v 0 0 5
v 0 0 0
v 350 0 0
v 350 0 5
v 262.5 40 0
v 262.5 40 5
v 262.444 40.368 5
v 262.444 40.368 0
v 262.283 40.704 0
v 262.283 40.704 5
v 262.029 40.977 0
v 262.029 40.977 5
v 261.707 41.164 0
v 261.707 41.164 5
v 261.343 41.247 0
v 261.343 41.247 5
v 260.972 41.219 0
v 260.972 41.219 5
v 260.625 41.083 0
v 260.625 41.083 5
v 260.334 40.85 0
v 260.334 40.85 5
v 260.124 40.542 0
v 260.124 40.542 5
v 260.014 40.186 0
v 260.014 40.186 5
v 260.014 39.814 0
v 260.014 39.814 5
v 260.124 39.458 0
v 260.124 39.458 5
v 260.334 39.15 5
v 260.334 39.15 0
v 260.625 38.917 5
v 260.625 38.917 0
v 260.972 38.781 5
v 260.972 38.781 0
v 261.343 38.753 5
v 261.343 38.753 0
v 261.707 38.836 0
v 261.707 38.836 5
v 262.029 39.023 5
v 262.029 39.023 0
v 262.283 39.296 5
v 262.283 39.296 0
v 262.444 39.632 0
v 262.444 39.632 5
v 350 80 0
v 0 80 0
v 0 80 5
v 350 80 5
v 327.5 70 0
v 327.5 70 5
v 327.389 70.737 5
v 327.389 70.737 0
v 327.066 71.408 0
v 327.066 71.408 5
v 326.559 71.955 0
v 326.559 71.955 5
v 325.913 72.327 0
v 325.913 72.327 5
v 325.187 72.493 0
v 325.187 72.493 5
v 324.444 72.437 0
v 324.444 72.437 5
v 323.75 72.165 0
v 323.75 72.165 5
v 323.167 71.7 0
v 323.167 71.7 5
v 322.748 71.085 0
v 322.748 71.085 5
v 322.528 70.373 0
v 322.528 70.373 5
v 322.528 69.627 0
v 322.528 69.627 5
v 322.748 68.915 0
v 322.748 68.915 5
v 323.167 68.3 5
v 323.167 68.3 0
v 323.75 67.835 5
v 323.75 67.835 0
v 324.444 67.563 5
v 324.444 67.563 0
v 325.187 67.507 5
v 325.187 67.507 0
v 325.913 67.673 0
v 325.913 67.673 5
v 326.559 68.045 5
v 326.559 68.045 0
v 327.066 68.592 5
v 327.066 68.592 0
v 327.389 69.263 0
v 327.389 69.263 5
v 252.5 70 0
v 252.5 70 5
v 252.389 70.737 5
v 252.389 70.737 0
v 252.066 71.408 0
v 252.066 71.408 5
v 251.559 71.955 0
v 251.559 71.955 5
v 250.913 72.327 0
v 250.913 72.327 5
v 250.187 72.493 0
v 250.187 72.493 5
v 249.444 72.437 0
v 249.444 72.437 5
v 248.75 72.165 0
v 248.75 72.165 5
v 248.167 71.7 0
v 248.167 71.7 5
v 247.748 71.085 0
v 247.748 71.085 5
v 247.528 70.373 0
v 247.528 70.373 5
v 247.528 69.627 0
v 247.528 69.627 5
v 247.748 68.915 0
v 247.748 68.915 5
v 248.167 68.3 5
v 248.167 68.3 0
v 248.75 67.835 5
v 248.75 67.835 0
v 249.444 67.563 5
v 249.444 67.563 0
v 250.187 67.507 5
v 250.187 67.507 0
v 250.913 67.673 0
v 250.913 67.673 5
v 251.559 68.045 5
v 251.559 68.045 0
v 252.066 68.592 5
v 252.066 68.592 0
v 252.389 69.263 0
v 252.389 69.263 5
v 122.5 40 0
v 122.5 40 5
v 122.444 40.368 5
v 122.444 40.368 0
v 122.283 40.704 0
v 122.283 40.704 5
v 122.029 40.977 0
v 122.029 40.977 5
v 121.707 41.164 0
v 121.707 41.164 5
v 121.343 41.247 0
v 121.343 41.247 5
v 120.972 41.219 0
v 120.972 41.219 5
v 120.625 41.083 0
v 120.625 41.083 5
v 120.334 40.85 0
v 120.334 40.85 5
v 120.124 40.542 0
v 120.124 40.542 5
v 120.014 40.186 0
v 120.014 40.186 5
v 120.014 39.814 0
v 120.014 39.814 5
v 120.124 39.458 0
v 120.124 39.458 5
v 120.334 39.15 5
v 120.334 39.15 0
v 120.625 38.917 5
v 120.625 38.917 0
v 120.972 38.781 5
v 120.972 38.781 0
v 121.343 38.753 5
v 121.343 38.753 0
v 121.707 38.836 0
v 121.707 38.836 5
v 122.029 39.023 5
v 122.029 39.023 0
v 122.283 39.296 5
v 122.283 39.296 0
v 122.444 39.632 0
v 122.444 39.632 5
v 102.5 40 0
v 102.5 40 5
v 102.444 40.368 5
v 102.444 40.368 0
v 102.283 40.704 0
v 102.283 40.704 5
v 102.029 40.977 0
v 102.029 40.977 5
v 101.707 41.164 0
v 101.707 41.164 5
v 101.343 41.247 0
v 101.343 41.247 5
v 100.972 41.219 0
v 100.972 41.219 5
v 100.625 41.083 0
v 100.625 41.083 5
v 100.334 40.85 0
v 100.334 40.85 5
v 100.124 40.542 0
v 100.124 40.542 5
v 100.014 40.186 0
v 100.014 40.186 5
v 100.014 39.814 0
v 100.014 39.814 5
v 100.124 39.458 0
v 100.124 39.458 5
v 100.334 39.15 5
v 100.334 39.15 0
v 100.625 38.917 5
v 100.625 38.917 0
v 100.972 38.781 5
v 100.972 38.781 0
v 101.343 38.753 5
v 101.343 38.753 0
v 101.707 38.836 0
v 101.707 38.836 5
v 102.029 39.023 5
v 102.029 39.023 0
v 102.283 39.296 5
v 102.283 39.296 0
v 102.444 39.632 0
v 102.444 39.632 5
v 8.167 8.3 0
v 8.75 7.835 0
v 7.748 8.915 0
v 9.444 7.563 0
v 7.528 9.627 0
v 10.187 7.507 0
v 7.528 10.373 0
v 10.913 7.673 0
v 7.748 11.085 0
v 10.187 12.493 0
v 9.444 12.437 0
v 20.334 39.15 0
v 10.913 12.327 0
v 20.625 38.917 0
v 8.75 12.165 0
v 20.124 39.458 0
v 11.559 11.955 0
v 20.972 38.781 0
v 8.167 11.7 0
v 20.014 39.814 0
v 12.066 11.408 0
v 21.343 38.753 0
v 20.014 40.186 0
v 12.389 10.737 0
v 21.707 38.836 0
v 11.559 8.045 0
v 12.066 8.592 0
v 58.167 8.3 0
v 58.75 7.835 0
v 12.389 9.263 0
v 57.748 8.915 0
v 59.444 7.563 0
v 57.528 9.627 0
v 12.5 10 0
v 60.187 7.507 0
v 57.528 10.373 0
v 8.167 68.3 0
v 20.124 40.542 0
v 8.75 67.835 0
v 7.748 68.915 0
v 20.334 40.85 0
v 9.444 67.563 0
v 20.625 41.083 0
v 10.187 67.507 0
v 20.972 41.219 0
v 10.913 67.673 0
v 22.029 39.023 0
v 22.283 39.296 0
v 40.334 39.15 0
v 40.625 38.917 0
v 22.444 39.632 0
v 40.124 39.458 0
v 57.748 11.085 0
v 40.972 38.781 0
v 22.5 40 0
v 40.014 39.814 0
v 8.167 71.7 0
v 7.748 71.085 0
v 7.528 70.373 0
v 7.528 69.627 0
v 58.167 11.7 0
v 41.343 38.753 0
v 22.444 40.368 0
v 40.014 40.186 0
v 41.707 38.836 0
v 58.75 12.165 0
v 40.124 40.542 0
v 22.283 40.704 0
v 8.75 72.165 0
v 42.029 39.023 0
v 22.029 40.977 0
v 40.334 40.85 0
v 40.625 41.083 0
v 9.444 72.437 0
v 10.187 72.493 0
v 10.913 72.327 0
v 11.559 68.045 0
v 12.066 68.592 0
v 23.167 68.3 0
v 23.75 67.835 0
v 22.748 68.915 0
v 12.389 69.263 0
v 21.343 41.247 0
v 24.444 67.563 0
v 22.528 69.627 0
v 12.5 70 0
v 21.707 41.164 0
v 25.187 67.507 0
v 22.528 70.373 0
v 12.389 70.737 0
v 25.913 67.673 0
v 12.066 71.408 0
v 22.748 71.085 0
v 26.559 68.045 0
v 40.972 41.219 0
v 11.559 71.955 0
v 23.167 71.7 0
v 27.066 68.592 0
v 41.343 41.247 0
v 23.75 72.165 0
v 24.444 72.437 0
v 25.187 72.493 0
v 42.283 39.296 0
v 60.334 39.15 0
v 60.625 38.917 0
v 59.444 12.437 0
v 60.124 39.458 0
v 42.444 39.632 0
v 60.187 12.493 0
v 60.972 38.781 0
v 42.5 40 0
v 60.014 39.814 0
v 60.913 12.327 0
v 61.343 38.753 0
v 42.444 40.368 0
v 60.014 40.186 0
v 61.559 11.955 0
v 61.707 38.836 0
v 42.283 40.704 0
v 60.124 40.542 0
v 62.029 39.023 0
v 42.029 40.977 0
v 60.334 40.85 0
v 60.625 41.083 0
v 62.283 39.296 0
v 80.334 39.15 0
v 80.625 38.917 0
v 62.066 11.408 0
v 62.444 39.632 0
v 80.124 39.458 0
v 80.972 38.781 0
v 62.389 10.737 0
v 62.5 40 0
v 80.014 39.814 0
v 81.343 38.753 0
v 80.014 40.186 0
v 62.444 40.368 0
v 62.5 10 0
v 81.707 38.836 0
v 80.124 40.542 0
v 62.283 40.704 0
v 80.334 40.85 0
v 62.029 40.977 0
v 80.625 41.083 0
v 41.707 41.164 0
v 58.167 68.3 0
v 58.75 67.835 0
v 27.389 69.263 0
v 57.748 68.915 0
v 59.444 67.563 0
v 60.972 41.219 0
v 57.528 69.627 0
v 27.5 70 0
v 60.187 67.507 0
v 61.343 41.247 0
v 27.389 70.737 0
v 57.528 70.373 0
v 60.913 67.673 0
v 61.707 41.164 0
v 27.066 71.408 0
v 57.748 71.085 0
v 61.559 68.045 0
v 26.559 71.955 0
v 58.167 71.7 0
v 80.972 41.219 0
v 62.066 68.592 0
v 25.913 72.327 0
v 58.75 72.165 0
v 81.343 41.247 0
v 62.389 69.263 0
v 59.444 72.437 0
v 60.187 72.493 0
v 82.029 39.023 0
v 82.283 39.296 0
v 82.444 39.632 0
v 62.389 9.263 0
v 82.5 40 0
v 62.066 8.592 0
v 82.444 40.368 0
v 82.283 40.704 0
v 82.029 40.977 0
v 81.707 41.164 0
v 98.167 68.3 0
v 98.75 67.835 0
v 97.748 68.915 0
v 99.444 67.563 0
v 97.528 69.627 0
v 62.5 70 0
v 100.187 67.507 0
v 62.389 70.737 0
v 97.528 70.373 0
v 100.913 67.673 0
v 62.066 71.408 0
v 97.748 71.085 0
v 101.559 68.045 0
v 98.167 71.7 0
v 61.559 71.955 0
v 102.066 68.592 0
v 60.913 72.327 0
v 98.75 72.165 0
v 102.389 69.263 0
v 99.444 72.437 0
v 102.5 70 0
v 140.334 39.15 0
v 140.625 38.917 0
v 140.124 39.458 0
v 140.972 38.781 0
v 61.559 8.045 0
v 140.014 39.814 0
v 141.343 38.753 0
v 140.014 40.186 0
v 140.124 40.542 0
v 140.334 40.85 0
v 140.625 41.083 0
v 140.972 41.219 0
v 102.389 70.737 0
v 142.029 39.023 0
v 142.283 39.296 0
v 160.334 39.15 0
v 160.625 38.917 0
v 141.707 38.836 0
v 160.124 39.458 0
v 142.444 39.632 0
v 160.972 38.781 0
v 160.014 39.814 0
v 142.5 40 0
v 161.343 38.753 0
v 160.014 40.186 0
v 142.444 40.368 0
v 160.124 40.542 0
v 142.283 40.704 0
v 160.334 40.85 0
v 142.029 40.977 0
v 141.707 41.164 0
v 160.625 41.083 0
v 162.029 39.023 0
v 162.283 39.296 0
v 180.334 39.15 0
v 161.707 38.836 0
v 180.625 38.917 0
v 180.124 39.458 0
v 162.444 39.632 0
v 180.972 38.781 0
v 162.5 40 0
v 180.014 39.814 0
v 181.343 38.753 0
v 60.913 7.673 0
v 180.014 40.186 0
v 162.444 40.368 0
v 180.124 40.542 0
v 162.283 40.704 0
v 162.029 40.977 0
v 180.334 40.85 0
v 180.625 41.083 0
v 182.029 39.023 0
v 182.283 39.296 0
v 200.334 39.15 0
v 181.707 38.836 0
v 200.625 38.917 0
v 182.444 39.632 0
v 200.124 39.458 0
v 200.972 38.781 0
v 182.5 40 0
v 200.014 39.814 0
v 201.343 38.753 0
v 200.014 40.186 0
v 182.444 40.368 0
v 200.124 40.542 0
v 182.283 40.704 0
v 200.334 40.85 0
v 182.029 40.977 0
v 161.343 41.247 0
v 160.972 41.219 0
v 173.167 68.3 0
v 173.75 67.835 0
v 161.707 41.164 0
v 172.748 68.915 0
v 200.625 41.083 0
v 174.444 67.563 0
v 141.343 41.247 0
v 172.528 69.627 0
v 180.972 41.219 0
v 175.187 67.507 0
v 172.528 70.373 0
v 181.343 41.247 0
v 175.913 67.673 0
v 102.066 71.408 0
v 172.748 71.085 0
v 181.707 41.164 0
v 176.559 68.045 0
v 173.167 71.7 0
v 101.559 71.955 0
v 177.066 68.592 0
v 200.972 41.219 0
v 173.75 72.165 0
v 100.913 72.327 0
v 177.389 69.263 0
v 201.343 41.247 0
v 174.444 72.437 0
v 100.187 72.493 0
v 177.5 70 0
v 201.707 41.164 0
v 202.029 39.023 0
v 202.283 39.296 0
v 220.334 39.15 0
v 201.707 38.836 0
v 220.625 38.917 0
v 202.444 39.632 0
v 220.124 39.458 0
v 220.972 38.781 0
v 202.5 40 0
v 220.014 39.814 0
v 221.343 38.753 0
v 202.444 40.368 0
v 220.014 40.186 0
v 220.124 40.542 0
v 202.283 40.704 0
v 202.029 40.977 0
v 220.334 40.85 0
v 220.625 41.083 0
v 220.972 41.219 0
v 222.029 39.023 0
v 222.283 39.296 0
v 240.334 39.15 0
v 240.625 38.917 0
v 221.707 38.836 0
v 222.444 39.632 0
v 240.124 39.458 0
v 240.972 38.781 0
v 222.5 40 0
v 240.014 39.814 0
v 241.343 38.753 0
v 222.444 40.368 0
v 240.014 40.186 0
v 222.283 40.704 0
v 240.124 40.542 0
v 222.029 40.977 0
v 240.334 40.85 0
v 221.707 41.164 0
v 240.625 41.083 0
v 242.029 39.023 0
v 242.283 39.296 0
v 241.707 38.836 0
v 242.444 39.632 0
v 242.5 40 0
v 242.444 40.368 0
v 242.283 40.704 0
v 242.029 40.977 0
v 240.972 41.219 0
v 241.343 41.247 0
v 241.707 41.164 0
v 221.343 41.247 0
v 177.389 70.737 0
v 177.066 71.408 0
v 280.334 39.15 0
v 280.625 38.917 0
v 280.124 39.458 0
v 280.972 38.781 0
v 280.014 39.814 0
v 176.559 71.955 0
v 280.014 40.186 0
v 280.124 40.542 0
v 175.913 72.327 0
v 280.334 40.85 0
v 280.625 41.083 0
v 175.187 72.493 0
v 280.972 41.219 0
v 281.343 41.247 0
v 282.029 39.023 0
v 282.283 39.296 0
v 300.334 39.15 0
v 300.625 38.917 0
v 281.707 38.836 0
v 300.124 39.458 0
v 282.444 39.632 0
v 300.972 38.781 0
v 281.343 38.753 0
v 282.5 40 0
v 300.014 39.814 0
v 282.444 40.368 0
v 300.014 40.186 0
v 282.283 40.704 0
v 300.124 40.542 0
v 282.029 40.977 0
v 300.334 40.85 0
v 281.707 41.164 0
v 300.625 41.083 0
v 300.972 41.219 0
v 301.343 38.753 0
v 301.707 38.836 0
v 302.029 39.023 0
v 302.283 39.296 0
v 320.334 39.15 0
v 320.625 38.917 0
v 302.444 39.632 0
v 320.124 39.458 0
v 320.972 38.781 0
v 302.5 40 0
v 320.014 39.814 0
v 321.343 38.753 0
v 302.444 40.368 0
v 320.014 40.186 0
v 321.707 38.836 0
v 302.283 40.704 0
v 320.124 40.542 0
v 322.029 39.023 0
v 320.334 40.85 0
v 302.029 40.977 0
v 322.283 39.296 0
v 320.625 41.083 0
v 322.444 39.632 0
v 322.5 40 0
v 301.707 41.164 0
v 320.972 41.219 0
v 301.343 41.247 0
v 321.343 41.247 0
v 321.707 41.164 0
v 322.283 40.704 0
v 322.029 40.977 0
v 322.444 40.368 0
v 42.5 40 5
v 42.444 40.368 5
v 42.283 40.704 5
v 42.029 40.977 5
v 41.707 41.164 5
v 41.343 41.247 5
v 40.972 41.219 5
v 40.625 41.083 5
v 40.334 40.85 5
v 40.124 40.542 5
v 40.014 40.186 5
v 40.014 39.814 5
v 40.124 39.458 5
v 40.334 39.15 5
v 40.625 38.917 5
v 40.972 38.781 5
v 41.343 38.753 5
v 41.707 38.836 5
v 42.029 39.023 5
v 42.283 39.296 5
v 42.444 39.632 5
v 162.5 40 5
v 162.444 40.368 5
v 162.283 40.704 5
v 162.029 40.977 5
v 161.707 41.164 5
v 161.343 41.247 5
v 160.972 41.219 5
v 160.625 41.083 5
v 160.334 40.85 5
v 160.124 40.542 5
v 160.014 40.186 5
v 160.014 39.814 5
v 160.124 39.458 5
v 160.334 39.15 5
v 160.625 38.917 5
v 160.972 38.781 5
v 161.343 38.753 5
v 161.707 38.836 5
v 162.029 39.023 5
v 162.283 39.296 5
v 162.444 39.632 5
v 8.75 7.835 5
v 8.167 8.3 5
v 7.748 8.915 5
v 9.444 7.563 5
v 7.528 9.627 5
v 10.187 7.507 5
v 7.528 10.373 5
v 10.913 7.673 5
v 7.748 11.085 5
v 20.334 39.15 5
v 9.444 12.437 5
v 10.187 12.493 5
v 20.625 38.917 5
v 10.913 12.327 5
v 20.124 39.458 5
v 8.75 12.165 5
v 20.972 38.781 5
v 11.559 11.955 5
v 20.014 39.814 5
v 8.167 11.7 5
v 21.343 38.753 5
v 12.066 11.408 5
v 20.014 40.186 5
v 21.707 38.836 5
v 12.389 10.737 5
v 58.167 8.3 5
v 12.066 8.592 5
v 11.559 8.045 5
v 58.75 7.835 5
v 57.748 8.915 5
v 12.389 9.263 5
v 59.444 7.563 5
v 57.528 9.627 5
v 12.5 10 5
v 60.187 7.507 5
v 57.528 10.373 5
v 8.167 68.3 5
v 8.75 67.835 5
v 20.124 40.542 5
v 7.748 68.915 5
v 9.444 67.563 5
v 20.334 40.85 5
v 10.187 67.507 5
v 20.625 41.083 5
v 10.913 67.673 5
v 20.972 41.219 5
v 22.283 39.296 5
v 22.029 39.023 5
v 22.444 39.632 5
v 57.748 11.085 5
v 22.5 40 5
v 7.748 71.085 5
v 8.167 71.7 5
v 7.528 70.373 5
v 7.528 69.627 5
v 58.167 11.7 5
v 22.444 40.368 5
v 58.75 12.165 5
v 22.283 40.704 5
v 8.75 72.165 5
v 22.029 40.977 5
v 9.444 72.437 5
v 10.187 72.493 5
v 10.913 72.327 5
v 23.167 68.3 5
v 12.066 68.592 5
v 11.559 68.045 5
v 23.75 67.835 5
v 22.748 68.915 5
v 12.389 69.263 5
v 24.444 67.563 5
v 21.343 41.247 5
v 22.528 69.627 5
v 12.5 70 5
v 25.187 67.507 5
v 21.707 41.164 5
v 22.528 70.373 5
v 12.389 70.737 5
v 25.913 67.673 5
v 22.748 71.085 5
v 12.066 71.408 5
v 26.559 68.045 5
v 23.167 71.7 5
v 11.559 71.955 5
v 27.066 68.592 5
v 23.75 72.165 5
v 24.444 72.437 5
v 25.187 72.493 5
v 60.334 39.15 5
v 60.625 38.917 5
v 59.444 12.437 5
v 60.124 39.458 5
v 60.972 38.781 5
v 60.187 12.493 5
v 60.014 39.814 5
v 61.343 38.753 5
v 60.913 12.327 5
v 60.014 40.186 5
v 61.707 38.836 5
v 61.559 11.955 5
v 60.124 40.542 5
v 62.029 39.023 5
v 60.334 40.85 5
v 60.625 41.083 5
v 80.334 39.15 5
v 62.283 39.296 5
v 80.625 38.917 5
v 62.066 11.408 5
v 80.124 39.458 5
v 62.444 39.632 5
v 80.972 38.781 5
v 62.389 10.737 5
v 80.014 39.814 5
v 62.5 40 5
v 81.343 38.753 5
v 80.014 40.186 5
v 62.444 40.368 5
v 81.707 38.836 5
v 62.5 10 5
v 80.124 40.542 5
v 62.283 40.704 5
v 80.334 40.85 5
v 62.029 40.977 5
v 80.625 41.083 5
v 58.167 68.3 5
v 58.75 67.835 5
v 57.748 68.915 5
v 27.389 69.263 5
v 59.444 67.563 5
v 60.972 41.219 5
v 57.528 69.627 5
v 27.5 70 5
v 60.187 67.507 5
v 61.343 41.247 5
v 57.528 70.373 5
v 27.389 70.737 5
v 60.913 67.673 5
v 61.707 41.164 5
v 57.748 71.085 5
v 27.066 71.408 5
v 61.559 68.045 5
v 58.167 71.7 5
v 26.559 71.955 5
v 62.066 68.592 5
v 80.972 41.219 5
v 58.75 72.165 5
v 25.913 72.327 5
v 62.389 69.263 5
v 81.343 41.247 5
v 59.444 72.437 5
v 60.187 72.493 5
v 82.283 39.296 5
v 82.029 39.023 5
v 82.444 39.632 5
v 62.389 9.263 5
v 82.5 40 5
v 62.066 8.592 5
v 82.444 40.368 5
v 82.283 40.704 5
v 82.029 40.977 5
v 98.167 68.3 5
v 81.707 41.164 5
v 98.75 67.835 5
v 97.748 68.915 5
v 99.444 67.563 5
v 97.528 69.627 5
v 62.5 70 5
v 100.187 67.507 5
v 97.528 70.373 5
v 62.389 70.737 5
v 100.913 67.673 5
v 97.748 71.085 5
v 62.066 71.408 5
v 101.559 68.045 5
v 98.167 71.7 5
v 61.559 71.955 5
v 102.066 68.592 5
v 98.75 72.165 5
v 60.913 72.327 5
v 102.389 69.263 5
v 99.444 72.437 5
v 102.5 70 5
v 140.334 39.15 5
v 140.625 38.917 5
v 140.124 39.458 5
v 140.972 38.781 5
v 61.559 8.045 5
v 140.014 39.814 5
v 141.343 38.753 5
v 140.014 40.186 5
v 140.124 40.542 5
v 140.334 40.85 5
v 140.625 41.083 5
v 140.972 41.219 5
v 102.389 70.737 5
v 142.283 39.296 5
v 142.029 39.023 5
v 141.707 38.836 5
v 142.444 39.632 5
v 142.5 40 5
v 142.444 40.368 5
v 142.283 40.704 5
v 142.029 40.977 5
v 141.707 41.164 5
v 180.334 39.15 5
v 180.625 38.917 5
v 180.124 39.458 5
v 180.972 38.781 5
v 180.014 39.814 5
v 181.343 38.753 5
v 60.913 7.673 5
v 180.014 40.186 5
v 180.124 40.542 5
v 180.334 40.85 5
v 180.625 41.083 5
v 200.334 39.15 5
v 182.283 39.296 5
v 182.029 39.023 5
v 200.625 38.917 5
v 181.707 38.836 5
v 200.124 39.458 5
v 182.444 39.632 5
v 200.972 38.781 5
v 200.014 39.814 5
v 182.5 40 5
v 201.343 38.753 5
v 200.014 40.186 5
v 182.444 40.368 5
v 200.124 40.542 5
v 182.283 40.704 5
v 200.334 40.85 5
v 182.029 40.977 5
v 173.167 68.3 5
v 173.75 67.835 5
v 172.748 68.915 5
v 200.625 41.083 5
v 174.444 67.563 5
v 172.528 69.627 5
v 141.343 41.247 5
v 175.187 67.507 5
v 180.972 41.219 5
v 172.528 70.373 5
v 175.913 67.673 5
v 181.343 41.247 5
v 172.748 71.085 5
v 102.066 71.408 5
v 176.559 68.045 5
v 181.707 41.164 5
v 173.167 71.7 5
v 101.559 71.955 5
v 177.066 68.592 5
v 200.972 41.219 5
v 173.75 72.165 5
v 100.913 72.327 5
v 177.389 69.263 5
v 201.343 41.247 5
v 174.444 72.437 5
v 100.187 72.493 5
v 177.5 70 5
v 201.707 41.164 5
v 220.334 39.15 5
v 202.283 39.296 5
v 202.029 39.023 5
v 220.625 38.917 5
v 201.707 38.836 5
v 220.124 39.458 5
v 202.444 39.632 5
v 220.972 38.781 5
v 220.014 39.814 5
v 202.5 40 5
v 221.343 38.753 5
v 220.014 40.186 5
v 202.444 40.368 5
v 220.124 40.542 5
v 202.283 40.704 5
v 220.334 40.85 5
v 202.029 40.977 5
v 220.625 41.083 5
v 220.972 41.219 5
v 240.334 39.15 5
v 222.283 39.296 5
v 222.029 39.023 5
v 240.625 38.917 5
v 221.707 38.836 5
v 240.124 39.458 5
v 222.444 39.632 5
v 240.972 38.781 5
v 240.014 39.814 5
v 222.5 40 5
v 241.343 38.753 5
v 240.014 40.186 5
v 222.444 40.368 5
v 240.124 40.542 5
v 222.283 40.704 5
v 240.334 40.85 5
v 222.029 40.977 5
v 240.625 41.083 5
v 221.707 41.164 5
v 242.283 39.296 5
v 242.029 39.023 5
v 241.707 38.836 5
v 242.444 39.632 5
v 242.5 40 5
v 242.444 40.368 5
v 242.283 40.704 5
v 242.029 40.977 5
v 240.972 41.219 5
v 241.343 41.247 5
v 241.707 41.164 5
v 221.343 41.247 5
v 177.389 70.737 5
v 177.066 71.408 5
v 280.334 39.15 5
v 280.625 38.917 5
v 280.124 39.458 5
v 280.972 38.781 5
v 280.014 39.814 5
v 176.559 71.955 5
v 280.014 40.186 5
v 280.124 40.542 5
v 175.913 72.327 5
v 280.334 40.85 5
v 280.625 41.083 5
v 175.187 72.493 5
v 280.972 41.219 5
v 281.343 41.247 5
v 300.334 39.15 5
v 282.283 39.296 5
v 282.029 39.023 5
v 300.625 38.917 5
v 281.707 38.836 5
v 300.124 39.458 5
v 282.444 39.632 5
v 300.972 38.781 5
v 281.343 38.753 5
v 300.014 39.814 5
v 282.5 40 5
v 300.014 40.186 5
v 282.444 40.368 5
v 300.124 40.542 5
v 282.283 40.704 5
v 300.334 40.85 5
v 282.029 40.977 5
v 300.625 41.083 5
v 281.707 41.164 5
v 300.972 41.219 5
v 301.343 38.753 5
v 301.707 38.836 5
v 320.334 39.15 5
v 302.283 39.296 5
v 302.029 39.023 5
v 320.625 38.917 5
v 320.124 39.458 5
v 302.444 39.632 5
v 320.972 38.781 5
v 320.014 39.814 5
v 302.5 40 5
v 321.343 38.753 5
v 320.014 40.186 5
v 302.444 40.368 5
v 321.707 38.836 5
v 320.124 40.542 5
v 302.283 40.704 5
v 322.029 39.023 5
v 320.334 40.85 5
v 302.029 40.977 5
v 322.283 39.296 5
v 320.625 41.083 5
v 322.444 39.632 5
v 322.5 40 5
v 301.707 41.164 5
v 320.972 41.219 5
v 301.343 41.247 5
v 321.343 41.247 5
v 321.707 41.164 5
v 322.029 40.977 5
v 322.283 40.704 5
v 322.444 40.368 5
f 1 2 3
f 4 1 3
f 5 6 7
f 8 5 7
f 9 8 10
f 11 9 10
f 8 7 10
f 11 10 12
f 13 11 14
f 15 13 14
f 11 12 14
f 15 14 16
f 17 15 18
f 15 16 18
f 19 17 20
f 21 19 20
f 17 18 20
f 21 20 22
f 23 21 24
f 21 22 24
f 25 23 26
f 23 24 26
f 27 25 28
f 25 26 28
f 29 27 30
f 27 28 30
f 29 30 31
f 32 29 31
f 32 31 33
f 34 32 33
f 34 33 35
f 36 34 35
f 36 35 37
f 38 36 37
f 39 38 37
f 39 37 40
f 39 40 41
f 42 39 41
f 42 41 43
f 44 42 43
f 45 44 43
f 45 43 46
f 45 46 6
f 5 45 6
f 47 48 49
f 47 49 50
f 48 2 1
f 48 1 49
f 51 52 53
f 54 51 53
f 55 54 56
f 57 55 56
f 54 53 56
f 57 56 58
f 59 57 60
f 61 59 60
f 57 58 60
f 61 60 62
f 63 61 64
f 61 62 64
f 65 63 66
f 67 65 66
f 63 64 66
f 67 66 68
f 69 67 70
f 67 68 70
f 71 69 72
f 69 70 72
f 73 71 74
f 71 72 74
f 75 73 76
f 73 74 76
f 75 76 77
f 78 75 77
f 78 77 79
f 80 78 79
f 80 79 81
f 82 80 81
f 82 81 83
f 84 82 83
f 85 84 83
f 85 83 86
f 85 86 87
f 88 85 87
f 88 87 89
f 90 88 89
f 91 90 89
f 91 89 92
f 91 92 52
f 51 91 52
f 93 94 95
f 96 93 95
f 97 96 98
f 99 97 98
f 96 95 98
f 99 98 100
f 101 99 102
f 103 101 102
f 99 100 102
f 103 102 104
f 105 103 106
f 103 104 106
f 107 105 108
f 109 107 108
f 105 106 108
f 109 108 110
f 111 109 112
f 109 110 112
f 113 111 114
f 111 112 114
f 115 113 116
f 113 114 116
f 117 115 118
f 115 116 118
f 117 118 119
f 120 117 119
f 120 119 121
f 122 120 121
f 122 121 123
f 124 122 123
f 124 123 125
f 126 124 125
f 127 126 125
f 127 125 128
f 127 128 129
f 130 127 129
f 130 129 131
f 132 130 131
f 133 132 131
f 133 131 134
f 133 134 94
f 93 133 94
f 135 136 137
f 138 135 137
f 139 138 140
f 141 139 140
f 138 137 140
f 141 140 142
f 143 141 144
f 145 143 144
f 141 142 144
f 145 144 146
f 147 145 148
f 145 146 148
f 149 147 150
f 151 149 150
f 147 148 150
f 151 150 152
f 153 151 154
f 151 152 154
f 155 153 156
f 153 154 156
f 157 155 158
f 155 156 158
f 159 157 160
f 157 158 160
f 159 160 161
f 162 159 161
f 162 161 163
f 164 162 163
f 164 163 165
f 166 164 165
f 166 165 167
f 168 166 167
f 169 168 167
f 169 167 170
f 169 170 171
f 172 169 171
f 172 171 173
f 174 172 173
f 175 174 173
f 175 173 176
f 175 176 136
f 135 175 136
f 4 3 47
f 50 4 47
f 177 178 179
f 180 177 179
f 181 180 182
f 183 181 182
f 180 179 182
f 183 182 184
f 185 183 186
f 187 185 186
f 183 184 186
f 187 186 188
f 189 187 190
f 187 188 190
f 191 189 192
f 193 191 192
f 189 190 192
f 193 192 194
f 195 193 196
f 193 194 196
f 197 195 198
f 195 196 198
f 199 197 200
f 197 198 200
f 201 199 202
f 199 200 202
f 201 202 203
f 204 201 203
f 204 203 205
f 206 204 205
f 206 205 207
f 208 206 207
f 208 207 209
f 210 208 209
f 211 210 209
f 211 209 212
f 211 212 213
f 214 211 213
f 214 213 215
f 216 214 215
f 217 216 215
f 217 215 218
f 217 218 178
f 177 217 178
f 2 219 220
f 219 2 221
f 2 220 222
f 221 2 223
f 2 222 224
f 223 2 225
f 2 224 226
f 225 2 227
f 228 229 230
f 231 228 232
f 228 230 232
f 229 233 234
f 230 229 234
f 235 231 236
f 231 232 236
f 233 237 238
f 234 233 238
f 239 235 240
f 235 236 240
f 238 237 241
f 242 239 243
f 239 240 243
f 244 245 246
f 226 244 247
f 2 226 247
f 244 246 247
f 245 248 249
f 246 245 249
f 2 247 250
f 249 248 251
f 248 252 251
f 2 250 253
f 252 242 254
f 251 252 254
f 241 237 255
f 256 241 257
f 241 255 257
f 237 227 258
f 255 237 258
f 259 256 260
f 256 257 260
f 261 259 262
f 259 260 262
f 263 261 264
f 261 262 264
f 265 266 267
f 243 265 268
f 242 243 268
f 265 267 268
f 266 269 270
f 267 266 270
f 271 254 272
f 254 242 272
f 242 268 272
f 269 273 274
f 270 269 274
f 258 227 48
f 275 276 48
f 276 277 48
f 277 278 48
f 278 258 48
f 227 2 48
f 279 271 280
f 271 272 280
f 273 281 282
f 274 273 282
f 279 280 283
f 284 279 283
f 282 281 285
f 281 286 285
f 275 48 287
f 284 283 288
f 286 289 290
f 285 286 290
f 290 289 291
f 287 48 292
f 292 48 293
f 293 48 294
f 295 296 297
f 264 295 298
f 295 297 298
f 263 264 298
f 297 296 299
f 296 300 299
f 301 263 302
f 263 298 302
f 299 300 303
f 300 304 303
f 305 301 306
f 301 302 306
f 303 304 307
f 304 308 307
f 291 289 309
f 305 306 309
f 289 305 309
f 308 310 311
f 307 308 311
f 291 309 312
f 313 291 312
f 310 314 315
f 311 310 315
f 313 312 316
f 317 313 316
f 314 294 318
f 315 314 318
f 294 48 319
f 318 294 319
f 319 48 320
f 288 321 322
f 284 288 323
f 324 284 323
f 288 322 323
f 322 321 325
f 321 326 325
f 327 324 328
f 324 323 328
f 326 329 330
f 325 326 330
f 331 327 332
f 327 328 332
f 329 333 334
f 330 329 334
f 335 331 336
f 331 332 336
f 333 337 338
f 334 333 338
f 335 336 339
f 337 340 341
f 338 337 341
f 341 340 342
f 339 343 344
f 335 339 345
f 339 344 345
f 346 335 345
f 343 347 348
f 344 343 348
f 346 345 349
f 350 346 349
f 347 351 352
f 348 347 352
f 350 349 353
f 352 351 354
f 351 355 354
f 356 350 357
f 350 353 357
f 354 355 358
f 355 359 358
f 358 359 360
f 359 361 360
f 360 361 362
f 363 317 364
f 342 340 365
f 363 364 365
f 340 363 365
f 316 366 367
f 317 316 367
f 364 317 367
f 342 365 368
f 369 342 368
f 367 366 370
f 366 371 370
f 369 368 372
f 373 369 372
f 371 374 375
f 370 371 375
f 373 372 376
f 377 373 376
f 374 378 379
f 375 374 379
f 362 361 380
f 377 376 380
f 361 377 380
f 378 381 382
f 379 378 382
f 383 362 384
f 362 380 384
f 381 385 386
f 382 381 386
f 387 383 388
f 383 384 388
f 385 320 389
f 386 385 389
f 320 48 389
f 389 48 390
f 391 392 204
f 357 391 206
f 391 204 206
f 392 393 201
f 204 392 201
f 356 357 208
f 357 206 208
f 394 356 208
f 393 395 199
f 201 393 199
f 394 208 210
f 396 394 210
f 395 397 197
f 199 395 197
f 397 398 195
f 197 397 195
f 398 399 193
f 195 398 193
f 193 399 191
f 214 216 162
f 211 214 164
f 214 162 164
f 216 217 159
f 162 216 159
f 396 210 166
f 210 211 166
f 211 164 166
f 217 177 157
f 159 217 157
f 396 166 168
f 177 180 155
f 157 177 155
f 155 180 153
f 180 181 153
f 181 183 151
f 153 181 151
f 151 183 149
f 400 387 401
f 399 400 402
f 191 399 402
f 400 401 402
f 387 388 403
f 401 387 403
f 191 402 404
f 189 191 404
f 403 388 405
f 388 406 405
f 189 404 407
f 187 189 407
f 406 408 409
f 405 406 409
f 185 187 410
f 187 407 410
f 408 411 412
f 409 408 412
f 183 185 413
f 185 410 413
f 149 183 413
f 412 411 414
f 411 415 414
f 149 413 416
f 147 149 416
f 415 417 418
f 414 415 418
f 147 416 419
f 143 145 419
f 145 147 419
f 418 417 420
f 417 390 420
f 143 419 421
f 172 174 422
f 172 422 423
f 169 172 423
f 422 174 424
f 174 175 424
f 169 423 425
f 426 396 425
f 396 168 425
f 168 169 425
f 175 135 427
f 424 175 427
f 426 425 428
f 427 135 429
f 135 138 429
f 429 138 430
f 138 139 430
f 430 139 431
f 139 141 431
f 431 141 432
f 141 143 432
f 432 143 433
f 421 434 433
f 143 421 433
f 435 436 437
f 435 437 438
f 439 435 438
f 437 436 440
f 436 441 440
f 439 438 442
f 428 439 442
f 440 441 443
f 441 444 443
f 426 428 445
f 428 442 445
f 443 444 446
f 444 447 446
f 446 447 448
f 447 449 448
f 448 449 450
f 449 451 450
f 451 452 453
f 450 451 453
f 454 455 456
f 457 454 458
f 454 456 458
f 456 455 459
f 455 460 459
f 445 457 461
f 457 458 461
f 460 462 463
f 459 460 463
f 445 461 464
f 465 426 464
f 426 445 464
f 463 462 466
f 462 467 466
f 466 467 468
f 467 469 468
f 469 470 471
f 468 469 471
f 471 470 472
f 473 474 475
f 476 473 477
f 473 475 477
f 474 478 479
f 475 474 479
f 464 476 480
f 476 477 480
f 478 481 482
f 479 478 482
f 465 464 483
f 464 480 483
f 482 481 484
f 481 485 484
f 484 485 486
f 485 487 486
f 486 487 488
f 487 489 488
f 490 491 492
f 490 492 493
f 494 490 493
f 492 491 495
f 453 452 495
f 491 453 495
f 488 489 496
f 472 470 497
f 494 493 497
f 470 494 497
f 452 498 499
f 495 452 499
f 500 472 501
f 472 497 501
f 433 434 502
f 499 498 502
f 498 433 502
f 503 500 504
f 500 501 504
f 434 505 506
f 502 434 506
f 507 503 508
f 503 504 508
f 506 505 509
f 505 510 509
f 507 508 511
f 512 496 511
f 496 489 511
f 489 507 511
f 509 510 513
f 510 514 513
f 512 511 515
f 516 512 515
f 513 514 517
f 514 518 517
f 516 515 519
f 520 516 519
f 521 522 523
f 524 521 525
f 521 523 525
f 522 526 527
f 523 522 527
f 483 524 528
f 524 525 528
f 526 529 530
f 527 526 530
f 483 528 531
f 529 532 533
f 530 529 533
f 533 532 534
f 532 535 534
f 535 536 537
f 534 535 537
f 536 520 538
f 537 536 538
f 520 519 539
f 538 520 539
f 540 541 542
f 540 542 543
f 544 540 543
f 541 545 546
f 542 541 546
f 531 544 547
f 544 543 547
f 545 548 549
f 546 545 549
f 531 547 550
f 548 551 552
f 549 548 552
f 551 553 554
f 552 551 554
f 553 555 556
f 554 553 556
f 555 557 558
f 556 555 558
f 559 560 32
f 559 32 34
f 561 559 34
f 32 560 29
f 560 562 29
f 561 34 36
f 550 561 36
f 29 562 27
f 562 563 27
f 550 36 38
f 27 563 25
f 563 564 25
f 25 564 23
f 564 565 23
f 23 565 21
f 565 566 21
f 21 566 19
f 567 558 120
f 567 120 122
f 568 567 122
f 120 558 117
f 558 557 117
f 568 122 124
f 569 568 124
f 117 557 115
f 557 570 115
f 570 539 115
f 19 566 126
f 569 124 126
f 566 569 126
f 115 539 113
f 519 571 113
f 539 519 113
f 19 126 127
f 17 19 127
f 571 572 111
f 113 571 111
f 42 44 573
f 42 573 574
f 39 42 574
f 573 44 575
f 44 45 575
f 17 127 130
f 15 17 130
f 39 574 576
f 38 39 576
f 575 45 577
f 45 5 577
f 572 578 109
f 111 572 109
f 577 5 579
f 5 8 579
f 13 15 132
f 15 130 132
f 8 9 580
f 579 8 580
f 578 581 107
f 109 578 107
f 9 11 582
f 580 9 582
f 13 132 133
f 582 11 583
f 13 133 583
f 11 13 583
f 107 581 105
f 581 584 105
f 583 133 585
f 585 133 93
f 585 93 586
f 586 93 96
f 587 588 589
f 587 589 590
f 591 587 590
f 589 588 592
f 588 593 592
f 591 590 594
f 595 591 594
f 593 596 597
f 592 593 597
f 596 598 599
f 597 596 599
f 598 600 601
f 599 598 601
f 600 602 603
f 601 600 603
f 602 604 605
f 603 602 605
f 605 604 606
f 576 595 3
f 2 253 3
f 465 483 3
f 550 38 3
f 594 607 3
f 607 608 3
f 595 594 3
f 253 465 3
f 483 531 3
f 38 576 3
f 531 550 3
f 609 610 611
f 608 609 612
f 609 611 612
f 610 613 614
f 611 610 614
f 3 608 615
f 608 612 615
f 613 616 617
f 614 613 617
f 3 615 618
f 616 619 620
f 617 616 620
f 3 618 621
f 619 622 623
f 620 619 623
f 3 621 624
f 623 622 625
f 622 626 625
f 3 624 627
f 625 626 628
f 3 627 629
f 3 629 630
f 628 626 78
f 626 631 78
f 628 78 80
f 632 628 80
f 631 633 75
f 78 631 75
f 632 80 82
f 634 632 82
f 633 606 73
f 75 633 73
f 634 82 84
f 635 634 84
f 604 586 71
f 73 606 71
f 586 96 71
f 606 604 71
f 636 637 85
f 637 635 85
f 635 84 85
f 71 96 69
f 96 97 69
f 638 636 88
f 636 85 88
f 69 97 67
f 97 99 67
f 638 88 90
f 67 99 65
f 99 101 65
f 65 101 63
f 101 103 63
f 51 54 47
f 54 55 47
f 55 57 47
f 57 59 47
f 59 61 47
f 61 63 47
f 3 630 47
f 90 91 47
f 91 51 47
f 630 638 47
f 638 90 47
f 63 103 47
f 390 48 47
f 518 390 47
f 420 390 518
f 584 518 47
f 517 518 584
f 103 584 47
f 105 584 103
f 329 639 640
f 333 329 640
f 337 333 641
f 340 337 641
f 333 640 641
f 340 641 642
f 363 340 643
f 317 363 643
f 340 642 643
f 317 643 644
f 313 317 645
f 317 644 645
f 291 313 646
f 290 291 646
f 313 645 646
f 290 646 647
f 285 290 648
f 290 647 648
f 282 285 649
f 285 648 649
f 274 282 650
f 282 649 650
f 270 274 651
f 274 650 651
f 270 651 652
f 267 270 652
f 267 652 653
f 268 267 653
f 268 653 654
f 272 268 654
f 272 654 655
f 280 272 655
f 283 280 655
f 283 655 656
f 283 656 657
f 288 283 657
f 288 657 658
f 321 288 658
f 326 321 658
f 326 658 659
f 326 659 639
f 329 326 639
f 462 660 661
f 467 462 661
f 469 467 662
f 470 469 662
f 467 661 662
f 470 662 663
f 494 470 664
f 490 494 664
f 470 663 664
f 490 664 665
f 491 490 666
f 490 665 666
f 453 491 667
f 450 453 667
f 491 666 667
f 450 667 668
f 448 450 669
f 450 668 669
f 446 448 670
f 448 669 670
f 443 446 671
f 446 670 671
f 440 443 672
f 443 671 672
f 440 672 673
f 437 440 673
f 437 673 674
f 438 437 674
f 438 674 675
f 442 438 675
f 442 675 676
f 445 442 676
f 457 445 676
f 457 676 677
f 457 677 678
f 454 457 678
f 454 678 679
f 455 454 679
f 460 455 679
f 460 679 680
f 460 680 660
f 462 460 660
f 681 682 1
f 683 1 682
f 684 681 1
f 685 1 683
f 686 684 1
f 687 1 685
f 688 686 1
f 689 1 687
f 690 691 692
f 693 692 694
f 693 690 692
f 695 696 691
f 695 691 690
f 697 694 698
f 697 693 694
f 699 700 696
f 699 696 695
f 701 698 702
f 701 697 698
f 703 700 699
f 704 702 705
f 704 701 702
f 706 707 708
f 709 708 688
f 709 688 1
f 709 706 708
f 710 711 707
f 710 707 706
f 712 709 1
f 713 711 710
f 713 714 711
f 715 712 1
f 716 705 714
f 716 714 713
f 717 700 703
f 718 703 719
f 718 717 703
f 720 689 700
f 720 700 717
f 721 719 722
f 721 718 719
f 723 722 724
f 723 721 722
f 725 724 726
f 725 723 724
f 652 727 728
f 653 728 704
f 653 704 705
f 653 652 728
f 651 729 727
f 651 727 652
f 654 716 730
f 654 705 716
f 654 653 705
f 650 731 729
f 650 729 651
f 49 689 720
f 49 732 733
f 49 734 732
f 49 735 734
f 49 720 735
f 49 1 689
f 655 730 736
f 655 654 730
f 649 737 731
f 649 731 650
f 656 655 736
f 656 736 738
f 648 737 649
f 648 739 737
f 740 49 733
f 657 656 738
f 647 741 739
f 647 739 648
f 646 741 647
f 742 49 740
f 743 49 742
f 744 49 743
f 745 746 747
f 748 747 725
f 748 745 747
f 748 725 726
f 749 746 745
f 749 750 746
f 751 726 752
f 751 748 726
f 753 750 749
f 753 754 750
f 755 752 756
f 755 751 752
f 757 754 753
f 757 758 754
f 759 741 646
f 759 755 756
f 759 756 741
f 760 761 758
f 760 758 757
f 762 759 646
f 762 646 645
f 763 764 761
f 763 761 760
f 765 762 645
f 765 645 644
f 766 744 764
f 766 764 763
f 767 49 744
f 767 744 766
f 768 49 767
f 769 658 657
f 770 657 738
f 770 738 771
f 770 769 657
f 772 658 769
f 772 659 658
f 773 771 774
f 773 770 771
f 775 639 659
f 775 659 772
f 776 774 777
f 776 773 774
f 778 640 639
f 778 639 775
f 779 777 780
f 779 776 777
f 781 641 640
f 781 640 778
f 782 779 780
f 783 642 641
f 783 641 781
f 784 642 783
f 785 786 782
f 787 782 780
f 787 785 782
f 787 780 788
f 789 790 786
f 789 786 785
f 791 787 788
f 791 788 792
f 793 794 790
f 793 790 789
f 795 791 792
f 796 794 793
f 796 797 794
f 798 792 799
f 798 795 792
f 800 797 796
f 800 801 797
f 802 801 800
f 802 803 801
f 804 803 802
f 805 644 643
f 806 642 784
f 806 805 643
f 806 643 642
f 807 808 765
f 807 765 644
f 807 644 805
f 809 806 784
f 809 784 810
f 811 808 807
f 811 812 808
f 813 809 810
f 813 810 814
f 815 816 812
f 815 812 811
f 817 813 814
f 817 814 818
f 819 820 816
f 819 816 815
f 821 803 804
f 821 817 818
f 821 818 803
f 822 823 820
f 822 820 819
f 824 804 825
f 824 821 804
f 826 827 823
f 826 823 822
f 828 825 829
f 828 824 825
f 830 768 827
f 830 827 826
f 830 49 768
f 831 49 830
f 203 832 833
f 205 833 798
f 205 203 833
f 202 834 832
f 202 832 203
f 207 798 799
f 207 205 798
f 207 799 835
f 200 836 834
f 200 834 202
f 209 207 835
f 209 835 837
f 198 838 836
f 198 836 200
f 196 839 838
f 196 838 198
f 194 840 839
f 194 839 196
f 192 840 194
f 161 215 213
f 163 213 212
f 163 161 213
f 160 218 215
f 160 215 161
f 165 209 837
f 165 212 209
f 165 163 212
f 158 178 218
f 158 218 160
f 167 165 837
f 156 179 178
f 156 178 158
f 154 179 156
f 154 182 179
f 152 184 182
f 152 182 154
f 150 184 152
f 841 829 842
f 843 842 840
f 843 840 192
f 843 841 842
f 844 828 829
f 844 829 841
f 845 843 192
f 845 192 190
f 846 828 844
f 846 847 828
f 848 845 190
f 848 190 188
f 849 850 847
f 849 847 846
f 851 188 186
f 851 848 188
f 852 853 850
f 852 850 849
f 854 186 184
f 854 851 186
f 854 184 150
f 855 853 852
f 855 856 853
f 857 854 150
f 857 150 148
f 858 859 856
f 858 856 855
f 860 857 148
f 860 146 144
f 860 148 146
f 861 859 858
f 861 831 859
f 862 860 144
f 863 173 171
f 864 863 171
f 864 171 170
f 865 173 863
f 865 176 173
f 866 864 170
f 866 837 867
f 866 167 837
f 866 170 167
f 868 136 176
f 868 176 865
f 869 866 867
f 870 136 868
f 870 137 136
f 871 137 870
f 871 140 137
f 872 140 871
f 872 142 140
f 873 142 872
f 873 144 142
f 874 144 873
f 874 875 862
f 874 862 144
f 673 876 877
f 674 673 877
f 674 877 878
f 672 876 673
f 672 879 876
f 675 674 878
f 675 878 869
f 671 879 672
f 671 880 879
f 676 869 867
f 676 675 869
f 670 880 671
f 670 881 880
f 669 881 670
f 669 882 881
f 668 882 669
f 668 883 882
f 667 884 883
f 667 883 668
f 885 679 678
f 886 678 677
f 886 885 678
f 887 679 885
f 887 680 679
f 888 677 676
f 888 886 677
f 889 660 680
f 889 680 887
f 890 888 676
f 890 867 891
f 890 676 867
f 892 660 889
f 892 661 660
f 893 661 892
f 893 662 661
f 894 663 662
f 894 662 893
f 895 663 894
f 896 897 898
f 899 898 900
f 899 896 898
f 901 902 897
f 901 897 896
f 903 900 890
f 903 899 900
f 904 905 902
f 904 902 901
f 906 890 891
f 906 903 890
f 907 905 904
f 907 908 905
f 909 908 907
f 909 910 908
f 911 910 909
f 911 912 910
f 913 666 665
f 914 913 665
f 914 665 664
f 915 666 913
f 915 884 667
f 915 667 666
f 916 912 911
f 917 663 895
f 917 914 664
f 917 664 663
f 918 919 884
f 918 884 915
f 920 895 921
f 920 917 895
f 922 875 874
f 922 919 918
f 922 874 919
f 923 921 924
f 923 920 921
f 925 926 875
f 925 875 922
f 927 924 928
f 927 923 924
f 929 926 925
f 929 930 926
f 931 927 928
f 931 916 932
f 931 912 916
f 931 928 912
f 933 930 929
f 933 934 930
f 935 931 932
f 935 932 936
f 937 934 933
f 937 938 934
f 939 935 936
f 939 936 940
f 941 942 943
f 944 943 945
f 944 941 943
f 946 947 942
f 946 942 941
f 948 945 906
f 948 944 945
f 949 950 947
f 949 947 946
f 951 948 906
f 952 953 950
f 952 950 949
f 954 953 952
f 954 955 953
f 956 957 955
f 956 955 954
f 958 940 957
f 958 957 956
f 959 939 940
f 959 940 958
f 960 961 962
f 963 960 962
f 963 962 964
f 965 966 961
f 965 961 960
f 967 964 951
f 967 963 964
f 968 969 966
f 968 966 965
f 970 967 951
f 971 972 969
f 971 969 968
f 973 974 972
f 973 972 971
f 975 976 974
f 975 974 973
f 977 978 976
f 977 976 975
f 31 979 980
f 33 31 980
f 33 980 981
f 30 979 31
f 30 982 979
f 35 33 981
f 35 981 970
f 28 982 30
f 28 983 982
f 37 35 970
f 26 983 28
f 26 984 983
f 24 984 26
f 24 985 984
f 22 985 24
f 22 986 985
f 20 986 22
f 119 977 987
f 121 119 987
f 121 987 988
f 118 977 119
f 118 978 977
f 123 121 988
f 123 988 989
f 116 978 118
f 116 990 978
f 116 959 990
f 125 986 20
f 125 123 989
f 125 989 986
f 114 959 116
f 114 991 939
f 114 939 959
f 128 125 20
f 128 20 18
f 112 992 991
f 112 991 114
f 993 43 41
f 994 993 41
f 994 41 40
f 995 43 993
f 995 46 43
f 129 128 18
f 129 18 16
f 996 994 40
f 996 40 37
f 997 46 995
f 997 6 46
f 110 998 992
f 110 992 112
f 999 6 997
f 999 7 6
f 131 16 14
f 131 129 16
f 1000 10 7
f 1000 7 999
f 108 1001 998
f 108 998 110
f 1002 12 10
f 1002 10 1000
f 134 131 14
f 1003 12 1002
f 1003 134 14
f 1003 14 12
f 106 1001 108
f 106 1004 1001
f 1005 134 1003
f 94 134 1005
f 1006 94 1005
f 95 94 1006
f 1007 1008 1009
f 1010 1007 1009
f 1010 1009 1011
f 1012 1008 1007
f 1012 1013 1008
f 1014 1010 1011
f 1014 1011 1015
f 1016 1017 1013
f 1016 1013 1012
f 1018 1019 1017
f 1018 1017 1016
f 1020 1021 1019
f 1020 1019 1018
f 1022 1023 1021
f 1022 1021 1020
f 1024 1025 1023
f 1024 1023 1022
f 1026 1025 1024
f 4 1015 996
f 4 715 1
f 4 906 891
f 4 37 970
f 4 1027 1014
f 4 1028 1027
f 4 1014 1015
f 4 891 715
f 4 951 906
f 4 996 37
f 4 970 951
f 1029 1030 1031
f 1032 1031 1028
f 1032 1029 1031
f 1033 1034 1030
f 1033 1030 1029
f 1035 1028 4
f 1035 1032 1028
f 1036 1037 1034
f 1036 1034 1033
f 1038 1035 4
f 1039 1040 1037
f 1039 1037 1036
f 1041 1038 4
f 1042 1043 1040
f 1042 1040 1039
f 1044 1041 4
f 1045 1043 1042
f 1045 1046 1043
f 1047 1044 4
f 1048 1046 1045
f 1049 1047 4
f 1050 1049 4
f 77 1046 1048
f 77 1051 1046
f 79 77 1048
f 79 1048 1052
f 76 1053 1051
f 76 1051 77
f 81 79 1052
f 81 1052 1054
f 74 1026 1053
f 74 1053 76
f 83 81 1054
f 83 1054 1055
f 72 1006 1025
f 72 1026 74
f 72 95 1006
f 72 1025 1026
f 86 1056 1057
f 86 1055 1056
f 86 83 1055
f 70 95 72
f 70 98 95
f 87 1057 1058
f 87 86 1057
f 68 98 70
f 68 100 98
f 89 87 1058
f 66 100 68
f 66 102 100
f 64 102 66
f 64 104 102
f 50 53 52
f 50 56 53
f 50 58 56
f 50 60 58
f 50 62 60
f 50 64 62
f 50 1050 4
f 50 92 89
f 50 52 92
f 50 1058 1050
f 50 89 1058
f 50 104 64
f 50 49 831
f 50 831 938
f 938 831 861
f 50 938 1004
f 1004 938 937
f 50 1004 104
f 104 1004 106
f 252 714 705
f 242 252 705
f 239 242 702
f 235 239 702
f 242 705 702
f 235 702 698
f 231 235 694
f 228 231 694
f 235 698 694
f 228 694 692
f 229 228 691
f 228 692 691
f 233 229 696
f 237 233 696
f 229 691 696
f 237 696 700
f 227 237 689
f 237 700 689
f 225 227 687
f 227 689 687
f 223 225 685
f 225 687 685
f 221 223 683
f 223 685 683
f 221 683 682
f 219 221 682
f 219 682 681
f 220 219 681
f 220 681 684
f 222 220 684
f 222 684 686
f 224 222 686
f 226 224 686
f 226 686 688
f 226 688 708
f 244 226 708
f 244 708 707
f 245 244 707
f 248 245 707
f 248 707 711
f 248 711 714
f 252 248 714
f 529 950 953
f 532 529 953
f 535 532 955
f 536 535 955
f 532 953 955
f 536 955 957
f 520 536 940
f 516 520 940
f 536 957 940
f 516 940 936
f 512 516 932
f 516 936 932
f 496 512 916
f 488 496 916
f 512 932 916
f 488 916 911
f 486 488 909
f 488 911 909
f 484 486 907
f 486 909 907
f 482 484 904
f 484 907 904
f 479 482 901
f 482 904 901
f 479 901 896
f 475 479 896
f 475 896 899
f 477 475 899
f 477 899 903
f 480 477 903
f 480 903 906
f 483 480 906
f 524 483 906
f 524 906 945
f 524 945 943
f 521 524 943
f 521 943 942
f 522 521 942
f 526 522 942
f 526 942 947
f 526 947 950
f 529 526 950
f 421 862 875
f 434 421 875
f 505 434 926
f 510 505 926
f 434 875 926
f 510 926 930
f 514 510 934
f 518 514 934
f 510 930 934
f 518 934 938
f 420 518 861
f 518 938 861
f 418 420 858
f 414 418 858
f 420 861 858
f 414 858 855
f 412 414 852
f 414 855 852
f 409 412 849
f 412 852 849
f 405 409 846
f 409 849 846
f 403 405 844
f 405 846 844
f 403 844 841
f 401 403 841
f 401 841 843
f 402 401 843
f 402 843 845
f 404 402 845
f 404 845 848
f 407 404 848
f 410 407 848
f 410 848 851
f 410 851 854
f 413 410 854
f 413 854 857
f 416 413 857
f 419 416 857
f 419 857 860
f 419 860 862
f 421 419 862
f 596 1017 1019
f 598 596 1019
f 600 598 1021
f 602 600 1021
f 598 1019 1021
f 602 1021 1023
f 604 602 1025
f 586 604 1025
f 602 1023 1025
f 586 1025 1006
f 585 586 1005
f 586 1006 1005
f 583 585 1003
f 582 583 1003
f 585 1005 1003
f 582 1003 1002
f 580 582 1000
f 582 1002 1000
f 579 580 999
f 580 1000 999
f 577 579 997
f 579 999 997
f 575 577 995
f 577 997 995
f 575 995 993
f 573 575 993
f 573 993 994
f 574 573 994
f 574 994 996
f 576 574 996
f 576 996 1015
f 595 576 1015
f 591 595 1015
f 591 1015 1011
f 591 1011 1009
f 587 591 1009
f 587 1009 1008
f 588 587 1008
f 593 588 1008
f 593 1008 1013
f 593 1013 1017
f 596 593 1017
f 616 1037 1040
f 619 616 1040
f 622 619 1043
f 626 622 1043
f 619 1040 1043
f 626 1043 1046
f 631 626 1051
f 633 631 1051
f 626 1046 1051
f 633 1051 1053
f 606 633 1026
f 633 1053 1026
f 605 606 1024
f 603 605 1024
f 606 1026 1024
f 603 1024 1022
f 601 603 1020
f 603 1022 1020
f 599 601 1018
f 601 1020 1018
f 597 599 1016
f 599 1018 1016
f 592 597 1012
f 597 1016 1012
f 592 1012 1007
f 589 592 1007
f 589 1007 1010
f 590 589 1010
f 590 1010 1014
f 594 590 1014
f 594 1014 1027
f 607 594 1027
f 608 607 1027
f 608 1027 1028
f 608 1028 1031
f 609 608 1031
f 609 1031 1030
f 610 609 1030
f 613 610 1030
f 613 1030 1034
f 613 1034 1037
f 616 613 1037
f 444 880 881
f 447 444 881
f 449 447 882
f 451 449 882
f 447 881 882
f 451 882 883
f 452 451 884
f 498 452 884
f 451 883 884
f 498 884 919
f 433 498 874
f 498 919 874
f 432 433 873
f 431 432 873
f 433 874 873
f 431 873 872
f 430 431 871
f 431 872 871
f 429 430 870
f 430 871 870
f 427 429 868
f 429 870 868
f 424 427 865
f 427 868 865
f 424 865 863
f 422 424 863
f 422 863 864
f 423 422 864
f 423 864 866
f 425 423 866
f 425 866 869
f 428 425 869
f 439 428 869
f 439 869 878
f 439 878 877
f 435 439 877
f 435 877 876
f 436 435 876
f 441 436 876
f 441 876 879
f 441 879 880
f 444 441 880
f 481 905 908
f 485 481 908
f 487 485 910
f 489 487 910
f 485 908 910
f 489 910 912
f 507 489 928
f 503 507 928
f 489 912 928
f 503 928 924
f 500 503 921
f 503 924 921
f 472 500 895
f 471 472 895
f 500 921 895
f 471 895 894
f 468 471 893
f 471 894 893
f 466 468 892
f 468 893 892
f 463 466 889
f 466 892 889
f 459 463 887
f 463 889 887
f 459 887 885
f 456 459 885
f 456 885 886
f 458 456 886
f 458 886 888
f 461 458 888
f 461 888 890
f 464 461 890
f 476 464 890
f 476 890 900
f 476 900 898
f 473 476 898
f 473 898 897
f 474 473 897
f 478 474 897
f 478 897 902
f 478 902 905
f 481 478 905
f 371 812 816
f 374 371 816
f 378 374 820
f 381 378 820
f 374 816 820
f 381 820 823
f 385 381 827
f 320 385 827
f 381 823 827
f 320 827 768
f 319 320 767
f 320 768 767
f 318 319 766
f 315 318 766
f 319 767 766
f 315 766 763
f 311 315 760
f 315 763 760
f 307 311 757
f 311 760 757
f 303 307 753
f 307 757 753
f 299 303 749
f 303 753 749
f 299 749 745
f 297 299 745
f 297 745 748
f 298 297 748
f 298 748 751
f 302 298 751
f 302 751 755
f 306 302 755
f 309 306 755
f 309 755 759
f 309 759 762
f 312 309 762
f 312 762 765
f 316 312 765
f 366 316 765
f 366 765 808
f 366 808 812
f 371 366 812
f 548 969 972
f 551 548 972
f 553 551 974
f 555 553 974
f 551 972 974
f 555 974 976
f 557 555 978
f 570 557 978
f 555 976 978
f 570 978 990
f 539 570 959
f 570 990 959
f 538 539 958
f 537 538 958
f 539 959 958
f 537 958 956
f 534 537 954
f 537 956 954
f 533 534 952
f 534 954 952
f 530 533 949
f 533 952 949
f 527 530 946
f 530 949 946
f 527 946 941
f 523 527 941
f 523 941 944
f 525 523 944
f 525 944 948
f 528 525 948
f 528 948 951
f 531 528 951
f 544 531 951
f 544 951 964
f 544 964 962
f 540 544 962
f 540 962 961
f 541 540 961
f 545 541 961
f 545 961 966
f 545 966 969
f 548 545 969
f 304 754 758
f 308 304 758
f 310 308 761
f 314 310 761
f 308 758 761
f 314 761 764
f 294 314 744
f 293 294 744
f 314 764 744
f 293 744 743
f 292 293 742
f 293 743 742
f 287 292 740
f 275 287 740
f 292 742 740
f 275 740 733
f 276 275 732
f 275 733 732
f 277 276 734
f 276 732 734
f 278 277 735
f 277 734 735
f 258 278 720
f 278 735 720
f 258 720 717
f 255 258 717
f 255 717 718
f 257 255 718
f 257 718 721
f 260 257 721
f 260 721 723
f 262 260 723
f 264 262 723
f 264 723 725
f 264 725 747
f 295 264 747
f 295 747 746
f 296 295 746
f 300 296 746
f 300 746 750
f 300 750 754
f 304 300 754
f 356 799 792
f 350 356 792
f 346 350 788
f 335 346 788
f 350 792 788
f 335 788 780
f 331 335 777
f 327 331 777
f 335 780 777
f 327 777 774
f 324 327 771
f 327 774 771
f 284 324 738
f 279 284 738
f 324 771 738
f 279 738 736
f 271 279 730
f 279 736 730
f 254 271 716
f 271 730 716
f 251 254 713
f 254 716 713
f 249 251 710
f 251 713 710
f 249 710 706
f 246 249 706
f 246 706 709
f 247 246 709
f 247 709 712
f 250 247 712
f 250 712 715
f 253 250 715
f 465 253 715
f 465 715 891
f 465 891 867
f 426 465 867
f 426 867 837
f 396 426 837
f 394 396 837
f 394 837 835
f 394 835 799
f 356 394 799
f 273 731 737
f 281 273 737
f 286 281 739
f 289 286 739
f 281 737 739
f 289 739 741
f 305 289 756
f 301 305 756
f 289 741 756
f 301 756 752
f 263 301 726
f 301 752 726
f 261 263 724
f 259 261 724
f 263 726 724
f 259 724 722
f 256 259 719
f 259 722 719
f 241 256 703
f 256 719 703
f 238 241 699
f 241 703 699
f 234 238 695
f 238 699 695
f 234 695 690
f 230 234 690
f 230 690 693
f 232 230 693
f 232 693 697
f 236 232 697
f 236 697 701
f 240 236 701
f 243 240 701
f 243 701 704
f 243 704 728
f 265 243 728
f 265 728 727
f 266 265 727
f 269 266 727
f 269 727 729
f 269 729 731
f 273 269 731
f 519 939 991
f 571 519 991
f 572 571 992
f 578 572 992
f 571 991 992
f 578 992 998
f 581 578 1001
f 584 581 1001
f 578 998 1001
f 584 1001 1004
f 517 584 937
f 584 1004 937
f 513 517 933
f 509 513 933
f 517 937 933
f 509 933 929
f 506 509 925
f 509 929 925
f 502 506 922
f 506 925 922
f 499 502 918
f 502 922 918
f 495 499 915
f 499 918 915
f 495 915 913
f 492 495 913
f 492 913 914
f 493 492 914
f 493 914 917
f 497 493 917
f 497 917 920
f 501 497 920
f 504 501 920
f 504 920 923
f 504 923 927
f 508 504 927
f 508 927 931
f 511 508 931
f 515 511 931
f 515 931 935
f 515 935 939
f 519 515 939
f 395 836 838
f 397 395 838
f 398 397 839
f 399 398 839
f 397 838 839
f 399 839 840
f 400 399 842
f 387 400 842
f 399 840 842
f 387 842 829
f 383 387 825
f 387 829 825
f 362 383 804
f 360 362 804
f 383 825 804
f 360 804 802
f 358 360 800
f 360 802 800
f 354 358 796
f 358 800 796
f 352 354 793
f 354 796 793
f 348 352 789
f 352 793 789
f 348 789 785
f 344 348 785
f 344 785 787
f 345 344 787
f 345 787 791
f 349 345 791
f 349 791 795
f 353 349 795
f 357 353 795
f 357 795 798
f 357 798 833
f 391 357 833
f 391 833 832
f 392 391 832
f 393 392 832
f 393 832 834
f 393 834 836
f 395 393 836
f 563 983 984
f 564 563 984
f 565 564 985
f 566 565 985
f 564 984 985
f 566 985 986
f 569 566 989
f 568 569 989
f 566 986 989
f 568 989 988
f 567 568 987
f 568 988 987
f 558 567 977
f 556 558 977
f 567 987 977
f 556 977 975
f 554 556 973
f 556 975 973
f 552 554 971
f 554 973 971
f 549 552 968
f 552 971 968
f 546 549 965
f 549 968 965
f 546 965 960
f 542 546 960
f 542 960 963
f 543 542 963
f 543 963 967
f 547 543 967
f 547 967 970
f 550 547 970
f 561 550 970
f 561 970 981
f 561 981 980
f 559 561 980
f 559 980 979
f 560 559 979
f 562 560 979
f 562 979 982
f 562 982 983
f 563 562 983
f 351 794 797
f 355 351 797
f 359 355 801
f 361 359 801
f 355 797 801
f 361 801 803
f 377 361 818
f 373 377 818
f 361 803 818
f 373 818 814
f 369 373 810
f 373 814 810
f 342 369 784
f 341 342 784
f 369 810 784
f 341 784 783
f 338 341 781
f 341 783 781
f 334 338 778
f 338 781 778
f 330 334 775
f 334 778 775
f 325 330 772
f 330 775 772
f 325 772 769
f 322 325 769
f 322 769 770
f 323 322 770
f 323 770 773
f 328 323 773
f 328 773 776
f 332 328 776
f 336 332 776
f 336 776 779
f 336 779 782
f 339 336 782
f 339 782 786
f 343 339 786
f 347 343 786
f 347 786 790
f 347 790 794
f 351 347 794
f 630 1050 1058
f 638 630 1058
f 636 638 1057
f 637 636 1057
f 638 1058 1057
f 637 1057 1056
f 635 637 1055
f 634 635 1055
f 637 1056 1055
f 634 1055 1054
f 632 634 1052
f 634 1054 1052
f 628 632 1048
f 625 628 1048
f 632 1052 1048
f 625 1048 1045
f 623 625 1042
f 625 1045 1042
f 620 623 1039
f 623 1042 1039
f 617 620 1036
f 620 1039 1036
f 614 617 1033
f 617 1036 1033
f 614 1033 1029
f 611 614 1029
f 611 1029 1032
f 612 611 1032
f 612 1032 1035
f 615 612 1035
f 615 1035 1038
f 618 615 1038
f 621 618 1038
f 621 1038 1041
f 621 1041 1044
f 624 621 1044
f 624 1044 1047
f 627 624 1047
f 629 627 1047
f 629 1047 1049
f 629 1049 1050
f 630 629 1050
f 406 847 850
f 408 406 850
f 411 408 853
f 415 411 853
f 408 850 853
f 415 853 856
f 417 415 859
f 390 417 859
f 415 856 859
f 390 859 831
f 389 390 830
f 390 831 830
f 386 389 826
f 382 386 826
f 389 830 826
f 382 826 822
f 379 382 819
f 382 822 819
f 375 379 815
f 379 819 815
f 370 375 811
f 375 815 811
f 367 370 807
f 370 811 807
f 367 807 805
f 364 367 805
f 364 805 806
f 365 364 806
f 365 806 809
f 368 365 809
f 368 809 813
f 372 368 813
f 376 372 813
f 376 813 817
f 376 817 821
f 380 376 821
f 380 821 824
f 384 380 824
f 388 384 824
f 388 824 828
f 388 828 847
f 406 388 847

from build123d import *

# Parameters (mm, degrees)
F0_W     = 350
F0_H     = 80
F1_DEPTH = 5
F2_R     = 1.25
F3_DEPTH = 5.001
F5_R     = 2.5
F6_DEPTH = 25
F7_R     = 2.5
F8_DEPTH = 25


with BuildPart() as f1:
    # F0 (on Top) → F1 (new body)
    with BuildSketch(Plane.XY):
        with Locations((175, 40)):
            Rectangle(F0_W, F0_H)
    extrude(amount=F1_DEPTH)

    # F2 (on face) → F3 (cut, through all)
    with BuildSketch(Plane.XY.offset(5)):
        with Locations((21.25, 40)):
            Circle(F2_R)
        with Locations((41.25, 40)):
            Circle(F2_R)
        with Locations((61.25, 40)):
            Circle(F2_R)
        with Locations((81.25, 40)):
            Circle(F2_R)
        with Locations((101.25, 40)):
            Circle(F2_R)
        with Locations((121.25, 40)):
            Circle(F2_R)
        with Locations((141.25, 40)):
            Circle(F2_R)
        with Locations((161.25, 40)):
            Circle(F2_R)
        with Locations((181.25, 40)):
            Circle(F2_R)
        with Locations((201.25, 40)):
            Circle(F2_R)
        with Locations((221.25, 40)):
            Circle(F2_R)
        with Locations((241.25, 40)):
            Circle(F2_R)
        with Locations((261.25, 40)):
            Circle(F2_R)
        with Locations((281.25, 40)):
            Circle(F2_R)
        with Locations((301.25, 40)):
            Circle(F2_R)
        with Locations((321.25, 40)):
            Circle(F2_R)
    extrude(amount=-F3_DEPTH, mode=Mode.SUBTRACT)

    # F5 (on face) → F6 (cut)
    with BuildSketch(Plane.XY.offset(5)):
        with Locations((25, 70)):
            Circle(F5_R)
        with Locations((100, 70)):
            Circle(F5_R)
        with Locations((175, 70)):
            Circle(F5_R)
        with Locations((250, 70)):
            Circle(F5_R)
        with Locations((325, 70)):
            Circle(F5_R)
    extrude(amount=-F6_DEPTH, mode=Mode.SUBTRACT)

    # F7 (on face) → F8 (cut)
    with BuildSketch(Plane.XY.offset(5)):
        with Locations((10, 70)):
            Circle(F7_R)
        with Locations((10, 10)):
            Circle(F7_R)
        with Locations((60, 70)):
            Circle(F7_R)
        with Locations((60, 10)):
            Circle(F7_R)
    extrude(amount=-F8_DEPTH, mode=Mode.SUBTRACT)


solid = f1.part
